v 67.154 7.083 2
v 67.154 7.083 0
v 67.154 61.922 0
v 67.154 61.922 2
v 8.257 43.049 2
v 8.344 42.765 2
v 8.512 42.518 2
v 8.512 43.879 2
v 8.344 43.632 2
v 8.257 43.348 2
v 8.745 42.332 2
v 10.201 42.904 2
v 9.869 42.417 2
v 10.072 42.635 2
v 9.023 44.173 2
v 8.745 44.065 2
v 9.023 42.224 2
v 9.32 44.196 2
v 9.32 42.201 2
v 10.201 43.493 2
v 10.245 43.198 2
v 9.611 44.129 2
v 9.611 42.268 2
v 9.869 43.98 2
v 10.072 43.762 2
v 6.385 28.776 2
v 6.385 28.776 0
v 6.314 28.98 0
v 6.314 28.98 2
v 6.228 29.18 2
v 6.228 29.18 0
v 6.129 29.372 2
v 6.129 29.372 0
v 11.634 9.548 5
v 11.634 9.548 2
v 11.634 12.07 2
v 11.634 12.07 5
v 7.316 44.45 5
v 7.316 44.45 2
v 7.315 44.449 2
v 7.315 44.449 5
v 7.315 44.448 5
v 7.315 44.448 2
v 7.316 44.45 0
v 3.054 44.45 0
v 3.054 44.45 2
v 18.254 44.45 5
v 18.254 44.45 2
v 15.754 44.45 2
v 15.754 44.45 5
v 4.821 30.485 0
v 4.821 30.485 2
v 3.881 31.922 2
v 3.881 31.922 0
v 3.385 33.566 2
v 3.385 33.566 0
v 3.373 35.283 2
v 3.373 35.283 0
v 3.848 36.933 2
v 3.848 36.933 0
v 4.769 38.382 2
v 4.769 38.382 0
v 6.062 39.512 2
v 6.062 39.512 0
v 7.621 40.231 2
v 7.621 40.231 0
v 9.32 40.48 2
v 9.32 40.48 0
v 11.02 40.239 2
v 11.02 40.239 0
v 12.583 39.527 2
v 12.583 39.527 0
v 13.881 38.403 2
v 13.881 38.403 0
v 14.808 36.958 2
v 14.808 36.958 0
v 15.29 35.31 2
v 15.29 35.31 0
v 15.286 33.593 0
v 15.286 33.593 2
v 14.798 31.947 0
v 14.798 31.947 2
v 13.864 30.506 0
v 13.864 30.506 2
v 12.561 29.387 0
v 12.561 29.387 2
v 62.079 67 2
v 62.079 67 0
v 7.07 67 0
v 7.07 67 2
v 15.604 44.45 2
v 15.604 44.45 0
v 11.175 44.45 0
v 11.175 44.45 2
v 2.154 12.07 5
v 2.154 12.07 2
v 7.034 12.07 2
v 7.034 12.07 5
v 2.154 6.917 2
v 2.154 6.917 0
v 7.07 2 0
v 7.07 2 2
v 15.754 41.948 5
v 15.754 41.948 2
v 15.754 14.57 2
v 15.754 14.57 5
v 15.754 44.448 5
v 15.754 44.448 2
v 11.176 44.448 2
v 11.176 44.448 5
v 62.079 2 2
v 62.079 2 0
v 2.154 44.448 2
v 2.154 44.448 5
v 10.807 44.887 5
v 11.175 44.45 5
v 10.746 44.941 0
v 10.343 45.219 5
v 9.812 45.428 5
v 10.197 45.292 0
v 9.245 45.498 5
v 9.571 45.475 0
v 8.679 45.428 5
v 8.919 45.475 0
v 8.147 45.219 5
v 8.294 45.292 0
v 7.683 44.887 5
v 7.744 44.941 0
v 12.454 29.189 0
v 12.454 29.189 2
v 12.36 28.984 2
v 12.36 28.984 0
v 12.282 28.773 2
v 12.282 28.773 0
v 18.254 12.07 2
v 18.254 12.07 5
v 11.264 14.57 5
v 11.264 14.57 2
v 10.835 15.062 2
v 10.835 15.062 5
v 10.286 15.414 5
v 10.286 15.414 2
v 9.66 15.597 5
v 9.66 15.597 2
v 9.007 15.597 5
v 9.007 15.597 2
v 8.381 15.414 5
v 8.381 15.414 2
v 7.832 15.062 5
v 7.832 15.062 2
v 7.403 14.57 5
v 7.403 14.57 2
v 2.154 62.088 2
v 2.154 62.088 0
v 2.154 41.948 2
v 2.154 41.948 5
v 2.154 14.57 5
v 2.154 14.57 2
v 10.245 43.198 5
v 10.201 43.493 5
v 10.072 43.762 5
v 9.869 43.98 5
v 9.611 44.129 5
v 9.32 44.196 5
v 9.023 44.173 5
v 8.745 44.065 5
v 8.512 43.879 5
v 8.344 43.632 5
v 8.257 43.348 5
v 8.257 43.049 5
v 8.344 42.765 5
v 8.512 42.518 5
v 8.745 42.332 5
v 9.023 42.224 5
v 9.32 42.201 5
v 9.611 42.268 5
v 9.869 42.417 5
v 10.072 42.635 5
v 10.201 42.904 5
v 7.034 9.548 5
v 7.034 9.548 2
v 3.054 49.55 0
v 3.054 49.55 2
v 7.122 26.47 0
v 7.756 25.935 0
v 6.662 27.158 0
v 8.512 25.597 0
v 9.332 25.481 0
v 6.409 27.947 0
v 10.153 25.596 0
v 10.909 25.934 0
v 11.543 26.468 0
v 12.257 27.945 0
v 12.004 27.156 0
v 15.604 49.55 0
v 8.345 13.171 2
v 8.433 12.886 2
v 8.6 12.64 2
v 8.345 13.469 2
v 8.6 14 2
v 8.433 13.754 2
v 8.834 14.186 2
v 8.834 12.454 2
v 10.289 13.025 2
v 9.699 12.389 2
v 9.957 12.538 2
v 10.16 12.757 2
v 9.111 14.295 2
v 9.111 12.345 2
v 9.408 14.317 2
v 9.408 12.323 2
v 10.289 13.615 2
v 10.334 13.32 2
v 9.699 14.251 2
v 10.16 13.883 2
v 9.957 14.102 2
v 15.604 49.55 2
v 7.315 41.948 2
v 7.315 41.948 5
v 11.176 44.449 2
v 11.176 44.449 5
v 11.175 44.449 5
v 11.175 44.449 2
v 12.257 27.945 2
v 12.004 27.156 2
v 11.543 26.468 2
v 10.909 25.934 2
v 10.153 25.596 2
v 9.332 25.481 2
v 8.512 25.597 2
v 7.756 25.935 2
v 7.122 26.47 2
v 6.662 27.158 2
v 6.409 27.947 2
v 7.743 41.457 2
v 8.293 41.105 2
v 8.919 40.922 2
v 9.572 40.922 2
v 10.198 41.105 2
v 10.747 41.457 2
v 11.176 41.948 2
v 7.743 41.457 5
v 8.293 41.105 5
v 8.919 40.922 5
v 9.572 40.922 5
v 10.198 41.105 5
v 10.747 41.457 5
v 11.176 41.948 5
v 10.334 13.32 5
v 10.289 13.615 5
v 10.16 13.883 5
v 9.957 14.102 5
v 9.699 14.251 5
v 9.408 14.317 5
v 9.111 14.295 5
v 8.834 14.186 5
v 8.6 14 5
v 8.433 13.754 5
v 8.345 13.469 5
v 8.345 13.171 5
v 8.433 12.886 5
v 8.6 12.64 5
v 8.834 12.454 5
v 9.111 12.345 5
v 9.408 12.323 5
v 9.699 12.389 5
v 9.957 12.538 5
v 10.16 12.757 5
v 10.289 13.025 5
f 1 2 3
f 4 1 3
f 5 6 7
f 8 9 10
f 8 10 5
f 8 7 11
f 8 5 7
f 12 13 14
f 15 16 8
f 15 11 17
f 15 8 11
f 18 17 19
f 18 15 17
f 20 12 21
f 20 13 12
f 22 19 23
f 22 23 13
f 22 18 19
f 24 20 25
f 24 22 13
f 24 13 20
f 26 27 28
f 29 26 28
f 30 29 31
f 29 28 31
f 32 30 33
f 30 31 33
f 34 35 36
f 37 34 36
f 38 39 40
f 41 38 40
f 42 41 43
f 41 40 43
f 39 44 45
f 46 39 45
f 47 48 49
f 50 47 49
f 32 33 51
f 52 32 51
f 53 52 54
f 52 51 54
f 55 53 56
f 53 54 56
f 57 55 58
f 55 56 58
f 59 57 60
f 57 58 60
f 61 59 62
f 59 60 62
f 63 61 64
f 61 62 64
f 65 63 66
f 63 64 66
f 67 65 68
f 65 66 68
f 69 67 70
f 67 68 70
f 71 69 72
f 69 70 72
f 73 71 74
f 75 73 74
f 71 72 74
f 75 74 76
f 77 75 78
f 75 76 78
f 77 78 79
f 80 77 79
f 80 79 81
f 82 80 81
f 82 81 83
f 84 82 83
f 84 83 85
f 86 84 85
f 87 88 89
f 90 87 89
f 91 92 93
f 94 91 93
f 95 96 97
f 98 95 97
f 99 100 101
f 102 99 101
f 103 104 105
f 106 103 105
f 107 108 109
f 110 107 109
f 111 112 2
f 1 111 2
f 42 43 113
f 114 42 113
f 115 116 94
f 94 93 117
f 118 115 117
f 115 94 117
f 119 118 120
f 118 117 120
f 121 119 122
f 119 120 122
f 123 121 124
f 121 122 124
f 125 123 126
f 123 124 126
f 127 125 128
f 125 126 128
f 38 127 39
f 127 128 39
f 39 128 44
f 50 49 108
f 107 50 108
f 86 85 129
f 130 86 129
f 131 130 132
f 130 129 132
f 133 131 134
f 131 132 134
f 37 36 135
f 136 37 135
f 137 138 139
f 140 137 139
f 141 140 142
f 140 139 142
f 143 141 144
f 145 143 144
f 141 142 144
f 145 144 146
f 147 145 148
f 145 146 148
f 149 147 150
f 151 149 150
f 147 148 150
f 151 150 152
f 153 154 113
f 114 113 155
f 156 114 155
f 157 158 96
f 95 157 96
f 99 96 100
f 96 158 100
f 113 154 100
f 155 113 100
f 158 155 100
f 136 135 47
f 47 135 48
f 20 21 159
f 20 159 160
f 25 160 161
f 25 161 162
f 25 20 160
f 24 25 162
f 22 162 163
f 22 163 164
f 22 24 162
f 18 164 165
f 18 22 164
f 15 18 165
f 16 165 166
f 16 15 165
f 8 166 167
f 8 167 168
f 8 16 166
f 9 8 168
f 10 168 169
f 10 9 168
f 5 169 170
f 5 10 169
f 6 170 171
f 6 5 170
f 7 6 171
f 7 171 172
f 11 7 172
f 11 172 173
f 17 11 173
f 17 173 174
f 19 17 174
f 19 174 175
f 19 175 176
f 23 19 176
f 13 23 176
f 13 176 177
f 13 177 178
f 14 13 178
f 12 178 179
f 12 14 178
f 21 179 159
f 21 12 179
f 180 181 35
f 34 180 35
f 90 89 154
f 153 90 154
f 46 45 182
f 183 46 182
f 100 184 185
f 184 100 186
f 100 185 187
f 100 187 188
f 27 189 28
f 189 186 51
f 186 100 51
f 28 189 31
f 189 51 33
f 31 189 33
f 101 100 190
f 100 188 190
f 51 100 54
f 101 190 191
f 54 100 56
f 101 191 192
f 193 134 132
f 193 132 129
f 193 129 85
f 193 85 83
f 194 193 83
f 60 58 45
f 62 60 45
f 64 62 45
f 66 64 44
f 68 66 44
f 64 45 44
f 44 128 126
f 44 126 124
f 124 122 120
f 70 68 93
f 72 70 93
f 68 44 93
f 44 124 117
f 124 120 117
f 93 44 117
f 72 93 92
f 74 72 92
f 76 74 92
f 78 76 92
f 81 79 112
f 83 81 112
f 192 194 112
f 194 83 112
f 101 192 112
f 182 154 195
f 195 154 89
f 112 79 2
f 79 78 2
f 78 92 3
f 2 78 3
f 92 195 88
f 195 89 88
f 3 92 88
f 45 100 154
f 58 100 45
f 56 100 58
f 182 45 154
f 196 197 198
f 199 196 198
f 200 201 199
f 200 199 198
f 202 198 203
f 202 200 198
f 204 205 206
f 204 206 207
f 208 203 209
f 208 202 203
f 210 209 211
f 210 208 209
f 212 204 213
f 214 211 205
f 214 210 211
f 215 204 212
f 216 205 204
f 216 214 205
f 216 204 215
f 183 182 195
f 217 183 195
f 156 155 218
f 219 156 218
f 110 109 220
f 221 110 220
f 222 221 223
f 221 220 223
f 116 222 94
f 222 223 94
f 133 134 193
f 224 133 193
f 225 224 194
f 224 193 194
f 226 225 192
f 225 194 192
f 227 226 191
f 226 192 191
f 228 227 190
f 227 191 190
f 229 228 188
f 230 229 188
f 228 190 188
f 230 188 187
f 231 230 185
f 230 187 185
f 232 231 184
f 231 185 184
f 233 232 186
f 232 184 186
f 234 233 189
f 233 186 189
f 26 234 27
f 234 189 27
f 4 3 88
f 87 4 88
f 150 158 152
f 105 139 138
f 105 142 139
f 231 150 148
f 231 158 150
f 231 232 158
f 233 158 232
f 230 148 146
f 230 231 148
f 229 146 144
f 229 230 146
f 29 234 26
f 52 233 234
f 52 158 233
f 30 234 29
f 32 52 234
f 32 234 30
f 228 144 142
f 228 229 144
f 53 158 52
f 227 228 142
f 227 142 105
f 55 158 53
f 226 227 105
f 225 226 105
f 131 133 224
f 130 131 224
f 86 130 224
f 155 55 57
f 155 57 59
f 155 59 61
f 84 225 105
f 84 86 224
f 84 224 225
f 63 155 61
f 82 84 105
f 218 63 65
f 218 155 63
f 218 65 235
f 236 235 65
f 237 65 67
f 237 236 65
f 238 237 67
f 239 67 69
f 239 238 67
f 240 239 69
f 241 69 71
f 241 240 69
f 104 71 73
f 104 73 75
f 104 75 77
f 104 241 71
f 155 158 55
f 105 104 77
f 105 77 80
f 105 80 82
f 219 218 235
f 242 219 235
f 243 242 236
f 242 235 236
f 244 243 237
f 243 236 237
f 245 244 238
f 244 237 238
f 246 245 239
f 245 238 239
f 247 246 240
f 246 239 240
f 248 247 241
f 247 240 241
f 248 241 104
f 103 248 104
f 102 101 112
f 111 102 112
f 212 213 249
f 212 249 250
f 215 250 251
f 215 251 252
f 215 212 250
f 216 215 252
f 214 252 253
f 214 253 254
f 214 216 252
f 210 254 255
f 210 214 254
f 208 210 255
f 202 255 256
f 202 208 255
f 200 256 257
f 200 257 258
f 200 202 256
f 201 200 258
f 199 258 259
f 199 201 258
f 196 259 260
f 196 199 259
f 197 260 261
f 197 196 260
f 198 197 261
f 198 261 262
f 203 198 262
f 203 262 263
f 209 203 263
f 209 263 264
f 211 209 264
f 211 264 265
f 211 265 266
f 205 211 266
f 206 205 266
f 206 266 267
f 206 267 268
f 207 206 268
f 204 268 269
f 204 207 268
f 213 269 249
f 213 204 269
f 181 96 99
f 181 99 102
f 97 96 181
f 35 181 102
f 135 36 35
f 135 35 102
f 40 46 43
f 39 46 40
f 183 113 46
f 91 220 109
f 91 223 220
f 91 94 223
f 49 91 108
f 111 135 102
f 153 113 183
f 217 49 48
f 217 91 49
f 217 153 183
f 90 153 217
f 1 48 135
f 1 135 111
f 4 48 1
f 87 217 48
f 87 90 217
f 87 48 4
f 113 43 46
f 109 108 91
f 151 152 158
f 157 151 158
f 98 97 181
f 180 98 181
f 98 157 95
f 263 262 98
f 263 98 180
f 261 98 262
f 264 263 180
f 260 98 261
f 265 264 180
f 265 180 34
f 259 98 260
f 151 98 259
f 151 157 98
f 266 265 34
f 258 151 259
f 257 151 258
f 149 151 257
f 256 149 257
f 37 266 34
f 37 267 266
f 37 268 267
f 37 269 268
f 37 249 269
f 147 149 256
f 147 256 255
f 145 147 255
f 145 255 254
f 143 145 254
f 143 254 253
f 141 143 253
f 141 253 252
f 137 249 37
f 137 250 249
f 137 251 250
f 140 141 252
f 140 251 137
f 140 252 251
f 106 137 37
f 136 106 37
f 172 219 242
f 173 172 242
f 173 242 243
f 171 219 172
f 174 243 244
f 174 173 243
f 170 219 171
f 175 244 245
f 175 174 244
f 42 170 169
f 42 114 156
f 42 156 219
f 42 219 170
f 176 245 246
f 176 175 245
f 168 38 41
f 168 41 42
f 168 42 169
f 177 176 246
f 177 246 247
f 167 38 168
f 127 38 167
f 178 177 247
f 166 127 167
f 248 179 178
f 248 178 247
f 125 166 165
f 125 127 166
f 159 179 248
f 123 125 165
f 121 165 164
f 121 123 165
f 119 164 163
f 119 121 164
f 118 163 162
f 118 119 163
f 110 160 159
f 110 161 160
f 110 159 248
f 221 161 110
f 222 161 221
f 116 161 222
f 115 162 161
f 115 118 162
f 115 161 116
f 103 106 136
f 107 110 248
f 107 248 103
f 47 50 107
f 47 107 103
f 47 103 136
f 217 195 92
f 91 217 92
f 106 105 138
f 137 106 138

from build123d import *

# Parameters (mm, degrees)
BOSS_EXTRUDE3_DEPTH = 2
SKETCH7_R           = 1
SKETCH7_W           = 2.5
SKETCH7_H           = 2.5
BOSS_EXTRUDE5_DEPTH = 3


with BuildPart() as part:
    # Sketch2 → Boss-Extrude3 (new body)
    with BuildSketch(Plane.XY):
        Polygon((62.078732257, 67), (7.070378023, 67), (2.153513577, 62.087886246), (2.153513577, 6.916864445), (7.070378023, 2), (62.078732257, 2), (67.153513577, 7.083274694), (67.153513577, 61.921636784), align=None)
        with BuildLine():
            ThreePointArc((12.561398281, 29.386897281), (12.405099811, 29.087669445), (12.28230409, 28.773205265))
            ThreePointArc((12.28230409, 28.773205265), (9.332354964, 25.48092154), (6.384978263, 28.775508397))
            ThreePointArc((6.384978263, 28.775508397), (6.272687262, 29.080787813), (6.128559615, 29.372390302))
            ThreePointArc((6.128559615, 29.372390302), (9.319946418, 40.479834047), (12.561398281, 29.386897281))
        make_face(mode=Mode.SUBTRACT)
        with BuildLine():
            Line((7.315683042, 44.45), (3.053513577, 44.45))
            Line((3.053513577, 44.45), (3.053513577, 49.55))
            Line((3.053513577, 49.55), (15.603513577, 49.55))
            Line((15.603513577, 49.55), (15.603513577, 44.45))
            Line((15.603513577, 44.45), (11.175073004, 44.45))
            ThreePointArc((11.175073004, 44.45), (9.245378023, 45.49849), (7.315683042, 44.45))
        make_face(mode=Mode.SUBTRACT)
    extrude(amount=BOSS_EXTRUDE3_DEPTH)

    # Sketch7 → Boss-Extrude5 (add)
    with BuildSketch(Plane.XY.offset(2)):
        with BuildLine():
            Line((15.753513577, 14.57), (11.264187035, 14.57))
            ThreePointArc((11.264187035, 14.57), (9.333513577, 15.62), (7.40284012, 14.57))
            Line((7.40284012, 14.57), (2.153513577, 14.57))
            Line((2.153513577, 14.57), (2.153513577, 12.07))
            Line((2.153513577, 12.07), (7.033513577, 12.07))
            Line((7.033513577, 12.07), (7.40284012, 12.07))
            ThreePointArc((7.40284012, 12.07), (9.333513577, 11.02), (11.264187035, 12.07))
            Line((11.264187035, 12.07), (11.633513577, 12.07))
            Line((11.633513577, 12.07), (15.753513577, 12.07))
            Line((15.753513577, 12.07), (15.753513577, 14.57))
        make_face()
        with Locations((9.333513577, 13.32)):
            Circle(SKETCH7_R, mode=Mode.SUBTRACT)
        with BuildLine():
            Line((11.633513577, 9.547776159), (11.633513577, 12.07))
            Line((11.633513577, 12.07), (11.264187035, 12.07))
            ThreePointArc((11.264187035, 12.07), (9.333513577, 11.02), (7.40284012, 12.07))
            Line((7.40284012, 12.07), (7.033513577, 12.07))
            Line((7.033513577, 12.07), (7.033513577, 9.547776159))
            Line((7.033513577, 9.547776159), (11.633513577, 9.547776159))
        make_face()
        with Locations((17.003513577, 13.32)):
            Rectangle(SKETCH7_W, SKETCH7_H)
        with BuildLine():
            Line((15.753513577, 16.534568208), (15.753513577, 14.57))
            Line((15.753513577, 14.57), (18.253513577, 14.57))
            Line((18.253513577, 14.57), (18.253513577, 16.534568208))
            Line((18.253513577, 16.534568208), (18.253513577, 44.45))
            Line((18.253513577, 44.45), (15.753513577, 44.45))
            Line((15.753513577, 44.45), (15.753513577, 44.44849))
            Line((15.753513577, 44.44849), (11.17605148, 44.44849))
            ThreePointArc((11.17605148, 44.44849), (11.17556239, 44.449245096), (11.175073004, 44.45))
            ThreePointArc((11.175073004, 44.45), (10.343450652, 45.219439406), (9.245378023, 45.49849))
            ThreePointArc((9.245378023, 45.49849), (8.147305393, 45.219439406), (7.315683042, 44.45))
            ThreePointArc((7.315683042, 44.45), (7.315193656, 44.449245096), (7.314704565, 44.44849))
            Line((7.314704565, 44.44849), (2.153513577, 44.44849))
            Line((2.153513577, 44.44849), (2.153513577, 41.94849))
            Line((2.153513577, 41.94849), (7.314704565, 41.94849))
            ThreePointArc((7.314704565, 41.94849), (9.245378023, 40.89849), (11.17605148, 41.94849))
            Line((11.17605148, 41.94849), (15.753513577, 41.94849))
            Line((15.753513577, 41.94849), (15.753513577, 16.534568208))
        make_face()
        with Locations((9.245378023, 43.19849)):
            Circle(SKETCH7_R, mode=Mode.SUBTRACT)
    extrude(amount=BOSS_EXTRUDE5_DEPTH)


solid = part.part
